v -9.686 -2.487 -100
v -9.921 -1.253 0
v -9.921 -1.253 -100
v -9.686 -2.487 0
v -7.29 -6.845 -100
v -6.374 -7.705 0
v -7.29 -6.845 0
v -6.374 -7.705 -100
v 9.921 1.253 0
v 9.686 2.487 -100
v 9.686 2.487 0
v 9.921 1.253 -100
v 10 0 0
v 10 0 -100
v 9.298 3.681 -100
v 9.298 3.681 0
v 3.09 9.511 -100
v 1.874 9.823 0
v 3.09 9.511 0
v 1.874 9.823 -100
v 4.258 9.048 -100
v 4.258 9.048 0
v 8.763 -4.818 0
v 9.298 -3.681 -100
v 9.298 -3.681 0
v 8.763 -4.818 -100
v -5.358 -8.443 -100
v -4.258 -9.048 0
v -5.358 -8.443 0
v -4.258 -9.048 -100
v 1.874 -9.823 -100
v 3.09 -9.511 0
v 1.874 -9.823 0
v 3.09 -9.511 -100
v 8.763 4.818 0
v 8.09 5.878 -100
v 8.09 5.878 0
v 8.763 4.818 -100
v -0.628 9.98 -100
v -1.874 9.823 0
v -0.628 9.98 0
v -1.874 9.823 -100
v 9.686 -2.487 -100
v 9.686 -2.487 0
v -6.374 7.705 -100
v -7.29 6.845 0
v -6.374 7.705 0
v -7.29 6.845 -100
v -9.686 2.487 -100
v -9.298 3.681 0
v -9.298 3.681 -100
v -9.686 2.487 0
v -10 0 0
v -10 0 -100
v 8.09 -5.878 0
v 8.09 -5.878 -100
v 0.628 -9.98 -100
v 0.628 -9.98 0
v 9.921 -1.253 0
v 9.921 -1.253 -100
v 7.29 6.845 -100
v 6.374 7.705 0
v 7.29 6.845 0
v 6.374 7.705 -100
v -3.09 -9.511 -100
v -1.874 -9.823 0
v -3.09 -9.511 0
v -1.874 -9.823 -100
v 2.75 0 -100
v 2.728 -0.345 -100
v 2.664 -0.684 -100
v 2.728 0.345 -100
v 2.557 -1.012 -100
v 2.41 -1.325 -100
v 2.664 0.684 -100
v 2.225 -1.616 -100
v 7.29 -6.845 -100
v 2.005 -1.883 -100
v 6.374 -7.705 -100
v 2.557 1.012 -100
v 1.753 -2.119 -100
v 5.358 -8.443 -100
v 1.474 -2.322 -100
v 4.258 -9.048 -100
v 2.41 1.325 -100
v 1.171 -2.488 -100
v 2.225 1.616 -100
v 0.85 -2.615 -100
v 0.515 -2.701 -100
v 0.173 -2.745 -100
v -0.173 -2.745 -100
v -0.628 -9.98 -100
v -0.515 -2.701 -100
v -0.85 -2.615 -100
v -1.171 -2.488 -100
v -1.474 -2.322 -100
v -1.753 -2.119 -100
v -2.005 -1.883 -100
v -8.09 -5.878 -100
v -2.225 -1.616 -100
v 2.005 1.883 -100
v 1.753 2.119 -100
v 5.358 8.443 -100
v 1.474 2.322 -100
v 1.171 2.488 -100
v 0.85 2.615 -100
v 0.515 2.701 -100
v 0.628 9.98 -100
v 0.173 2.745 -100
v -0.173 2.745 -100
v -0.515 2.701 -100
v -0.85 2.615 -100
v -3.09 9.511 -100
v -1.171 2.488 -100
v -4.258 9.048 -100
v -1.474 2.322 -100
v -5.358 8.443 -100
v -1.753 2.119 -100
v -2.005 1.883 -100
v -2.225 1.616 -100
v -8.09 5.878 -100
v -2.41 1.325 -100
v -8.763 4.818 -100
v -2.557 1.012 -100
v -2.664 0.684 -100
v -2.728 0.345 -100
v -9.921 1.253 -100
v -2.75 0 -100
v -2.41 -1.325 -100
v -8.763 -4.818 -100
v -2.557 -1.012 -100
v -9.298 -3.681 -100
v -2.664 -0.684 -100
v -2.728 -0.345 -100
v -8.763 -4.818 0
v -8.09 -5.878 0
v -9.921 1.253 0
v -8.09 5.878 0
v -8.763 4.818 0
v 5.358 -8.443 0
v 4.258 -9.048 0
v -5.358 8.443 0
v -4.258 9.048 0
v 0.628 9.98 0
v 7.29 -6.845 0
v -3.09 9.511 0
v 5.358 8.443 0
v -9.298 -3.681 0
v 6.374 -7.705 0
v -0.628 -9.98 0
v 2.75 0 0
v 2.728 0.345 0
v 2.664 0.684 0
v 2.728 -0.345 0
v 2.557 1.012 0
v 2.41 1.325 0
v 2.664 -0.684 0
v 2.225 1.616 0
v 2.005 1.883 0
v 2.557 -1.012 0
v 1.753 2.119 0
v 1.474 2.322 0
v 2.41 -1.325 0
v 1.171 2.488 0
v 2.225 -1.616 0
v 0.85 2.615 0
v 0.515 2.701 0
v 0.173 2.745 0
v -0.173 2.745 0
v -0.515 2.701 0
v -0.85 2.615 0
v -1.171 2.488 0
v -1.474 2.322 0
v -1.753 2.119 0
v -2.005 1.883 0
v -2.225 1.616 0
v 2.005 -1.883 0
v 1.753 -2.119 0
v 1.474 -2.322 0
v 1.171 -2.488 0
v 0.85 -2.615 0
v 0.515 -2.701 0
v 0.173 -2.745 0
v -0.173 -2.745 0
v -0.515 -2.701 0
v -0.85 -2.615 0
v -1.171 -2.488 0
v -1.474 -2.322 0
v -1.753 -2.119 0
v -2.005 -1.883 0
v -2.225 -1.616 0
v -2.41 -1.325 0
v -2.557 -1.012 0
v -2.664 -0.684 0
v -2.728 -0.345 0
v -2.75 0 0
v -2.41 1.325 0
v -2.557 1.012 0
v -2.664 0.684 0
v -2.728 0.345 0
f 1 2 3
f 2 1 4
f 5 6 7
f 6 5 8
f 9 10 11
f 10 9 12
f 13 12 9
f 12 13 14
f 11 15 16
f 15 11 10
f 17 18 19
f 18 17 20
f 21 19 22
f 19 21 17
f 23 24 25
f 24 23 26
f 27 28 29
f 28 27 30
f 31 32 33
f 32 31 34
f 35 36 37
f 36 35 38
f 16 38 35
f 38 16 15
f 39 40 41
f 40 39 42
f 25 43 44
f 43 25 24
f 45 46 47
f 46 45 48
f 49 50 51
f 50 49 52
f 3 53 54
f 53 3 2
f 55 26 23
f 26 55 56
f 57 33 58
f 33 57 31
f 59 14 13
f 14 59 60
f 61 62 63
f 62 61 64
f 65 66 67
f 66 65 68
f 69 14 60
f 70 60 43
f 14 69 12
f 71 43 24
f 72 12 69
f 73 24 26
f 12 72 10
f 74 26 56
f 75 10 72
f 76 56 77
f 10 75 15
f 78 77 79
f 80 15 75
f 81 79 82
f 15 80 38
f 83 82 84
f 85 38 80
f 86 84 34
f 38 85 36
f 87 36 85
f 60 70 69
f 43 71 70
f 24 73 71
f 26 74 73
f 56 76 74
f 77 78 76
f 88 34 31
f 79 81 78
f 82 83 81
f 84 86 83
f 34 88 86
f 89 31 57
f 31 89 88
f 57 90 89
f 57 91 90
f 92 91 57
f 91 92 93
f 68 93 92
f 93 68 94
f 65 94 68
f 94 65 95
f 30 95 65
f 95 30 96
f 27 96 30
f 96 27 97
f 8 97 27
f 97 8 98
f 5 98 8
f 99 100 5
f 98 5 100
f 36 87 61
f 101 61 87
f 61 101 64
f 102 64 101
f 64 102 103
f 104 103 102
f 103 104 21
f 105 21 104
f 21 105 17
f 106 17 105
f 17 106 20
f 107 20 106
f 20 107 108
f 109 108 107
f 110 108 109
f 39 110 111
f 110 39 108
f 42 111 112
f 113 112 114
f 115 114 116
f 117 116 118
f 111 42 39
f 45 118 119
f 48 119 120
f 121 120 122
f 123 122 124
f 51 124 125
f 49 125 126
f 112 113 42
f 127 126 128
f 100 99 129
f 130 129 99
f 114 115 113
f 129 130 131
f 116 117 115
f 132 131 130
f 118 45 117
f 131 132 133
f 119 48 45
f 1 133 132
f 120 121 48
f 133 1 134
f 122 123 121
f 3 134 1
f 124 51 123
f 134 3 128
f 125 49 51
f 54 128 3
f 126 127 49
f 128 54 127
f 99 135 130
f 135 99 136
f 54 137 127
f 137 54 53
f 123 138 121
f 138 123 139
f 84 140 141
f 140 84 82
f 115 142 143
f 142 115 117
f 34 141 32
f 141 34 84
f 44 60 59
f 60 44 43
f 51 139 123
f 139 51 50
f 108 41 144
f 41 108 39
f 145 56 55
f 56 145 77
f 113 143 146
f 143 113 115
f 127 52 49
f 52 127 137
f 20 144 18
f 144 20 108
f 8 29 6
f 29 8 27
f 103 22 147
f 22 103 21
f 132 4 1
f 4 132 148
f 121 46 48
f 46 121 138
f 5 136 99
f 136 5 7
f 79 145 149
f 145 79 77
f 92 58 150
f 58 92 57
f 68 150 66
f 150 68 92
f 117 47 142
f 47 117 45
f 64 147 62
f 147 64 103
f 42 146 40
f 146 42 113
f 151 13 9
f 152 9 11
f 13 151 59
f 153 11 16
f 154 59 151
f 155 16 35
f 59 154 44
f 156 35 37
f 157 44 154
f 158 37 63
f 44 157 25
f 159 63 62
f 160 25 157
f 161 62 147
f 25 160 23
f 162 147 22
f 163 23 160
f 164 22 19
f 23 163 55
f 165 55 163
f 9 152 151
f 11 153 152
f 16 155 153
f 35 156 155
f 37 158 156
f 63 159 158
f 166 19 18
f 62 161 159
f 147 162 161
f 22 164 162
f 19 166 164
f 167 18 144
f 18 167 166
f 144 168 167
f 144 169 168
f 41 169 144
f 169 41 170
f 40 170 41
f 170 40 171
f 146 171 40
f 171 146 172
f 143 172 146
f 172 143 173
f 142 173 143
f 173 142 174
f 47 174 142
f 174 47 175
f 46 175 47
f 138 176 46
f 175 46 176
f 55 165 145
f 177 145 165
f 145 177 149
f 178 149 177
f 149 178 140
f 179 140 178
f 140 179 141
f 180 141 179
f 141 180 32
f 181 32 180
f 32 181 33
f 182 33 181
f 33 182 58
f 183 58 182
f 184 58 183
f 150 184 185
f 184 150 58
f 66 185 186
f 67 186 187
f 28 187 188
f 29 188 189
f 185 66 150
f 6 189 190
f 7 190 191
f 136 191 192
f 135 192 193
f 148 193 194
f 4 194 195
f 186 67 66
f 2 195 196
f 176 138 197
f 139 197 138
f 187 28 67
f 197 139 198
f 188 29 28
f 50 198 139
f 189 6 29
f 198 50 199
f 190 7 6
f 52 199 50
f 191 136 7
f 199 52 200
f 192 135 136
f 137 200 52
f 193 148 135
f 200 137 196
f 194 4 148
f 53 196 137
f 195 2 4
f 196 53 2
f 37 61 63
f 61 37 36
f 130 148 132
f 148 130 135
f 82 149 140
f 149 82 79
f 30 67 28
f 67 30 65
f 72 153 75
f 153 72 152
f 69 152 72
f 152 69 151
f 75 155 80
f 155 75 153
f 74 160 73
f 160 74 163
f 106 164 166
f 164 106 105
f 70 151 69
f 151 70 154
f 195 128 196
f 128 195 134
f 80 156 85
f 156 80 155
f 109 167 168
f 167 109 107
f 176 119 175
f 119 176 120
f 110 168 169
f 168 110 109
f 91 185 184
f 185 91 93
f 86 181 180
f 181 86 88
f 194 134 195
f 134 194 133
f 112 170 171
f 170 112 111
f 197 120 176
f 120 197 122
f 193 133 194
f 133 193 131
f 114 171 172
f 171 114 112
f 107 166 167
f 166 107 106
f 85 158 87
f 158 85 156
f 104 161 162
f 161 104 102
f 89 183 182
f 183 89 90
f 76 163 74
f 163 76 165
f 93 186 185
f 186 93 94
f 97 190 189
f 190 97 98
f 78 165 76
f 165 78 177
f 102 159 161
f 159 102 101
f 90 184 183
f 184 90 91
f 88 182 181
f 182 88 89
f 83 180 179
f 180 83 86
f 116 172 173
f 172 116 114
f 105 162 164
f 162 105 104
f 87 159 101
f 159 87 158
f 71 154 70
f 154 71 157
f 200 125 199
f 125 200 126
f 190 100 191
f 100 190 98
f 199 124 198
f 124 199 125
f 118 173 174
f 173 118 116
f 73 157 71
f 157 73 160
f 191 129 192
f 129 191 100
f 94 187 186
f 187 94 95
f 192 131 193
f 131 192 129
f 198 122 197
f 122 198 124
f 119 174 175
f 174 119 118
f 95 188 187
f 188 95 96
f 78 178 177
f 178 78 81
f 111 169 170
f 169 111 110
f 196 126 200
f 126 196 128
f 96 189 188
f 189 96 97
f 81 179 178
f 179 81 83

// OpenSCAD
$fn = 50;


difference() {
	union() {
		translate(v = [0, 0, -100.0000000000]) {
			cylinder(h = 100, r = 10.0000000000);
		}
		cylinder(h = 0, r = 13.0000000000);
	}
	union() {
		#translate(v = [0, 0, -100]) {
			cylinder(h = 100, r = 2.7500000000);
		}
	}
}
